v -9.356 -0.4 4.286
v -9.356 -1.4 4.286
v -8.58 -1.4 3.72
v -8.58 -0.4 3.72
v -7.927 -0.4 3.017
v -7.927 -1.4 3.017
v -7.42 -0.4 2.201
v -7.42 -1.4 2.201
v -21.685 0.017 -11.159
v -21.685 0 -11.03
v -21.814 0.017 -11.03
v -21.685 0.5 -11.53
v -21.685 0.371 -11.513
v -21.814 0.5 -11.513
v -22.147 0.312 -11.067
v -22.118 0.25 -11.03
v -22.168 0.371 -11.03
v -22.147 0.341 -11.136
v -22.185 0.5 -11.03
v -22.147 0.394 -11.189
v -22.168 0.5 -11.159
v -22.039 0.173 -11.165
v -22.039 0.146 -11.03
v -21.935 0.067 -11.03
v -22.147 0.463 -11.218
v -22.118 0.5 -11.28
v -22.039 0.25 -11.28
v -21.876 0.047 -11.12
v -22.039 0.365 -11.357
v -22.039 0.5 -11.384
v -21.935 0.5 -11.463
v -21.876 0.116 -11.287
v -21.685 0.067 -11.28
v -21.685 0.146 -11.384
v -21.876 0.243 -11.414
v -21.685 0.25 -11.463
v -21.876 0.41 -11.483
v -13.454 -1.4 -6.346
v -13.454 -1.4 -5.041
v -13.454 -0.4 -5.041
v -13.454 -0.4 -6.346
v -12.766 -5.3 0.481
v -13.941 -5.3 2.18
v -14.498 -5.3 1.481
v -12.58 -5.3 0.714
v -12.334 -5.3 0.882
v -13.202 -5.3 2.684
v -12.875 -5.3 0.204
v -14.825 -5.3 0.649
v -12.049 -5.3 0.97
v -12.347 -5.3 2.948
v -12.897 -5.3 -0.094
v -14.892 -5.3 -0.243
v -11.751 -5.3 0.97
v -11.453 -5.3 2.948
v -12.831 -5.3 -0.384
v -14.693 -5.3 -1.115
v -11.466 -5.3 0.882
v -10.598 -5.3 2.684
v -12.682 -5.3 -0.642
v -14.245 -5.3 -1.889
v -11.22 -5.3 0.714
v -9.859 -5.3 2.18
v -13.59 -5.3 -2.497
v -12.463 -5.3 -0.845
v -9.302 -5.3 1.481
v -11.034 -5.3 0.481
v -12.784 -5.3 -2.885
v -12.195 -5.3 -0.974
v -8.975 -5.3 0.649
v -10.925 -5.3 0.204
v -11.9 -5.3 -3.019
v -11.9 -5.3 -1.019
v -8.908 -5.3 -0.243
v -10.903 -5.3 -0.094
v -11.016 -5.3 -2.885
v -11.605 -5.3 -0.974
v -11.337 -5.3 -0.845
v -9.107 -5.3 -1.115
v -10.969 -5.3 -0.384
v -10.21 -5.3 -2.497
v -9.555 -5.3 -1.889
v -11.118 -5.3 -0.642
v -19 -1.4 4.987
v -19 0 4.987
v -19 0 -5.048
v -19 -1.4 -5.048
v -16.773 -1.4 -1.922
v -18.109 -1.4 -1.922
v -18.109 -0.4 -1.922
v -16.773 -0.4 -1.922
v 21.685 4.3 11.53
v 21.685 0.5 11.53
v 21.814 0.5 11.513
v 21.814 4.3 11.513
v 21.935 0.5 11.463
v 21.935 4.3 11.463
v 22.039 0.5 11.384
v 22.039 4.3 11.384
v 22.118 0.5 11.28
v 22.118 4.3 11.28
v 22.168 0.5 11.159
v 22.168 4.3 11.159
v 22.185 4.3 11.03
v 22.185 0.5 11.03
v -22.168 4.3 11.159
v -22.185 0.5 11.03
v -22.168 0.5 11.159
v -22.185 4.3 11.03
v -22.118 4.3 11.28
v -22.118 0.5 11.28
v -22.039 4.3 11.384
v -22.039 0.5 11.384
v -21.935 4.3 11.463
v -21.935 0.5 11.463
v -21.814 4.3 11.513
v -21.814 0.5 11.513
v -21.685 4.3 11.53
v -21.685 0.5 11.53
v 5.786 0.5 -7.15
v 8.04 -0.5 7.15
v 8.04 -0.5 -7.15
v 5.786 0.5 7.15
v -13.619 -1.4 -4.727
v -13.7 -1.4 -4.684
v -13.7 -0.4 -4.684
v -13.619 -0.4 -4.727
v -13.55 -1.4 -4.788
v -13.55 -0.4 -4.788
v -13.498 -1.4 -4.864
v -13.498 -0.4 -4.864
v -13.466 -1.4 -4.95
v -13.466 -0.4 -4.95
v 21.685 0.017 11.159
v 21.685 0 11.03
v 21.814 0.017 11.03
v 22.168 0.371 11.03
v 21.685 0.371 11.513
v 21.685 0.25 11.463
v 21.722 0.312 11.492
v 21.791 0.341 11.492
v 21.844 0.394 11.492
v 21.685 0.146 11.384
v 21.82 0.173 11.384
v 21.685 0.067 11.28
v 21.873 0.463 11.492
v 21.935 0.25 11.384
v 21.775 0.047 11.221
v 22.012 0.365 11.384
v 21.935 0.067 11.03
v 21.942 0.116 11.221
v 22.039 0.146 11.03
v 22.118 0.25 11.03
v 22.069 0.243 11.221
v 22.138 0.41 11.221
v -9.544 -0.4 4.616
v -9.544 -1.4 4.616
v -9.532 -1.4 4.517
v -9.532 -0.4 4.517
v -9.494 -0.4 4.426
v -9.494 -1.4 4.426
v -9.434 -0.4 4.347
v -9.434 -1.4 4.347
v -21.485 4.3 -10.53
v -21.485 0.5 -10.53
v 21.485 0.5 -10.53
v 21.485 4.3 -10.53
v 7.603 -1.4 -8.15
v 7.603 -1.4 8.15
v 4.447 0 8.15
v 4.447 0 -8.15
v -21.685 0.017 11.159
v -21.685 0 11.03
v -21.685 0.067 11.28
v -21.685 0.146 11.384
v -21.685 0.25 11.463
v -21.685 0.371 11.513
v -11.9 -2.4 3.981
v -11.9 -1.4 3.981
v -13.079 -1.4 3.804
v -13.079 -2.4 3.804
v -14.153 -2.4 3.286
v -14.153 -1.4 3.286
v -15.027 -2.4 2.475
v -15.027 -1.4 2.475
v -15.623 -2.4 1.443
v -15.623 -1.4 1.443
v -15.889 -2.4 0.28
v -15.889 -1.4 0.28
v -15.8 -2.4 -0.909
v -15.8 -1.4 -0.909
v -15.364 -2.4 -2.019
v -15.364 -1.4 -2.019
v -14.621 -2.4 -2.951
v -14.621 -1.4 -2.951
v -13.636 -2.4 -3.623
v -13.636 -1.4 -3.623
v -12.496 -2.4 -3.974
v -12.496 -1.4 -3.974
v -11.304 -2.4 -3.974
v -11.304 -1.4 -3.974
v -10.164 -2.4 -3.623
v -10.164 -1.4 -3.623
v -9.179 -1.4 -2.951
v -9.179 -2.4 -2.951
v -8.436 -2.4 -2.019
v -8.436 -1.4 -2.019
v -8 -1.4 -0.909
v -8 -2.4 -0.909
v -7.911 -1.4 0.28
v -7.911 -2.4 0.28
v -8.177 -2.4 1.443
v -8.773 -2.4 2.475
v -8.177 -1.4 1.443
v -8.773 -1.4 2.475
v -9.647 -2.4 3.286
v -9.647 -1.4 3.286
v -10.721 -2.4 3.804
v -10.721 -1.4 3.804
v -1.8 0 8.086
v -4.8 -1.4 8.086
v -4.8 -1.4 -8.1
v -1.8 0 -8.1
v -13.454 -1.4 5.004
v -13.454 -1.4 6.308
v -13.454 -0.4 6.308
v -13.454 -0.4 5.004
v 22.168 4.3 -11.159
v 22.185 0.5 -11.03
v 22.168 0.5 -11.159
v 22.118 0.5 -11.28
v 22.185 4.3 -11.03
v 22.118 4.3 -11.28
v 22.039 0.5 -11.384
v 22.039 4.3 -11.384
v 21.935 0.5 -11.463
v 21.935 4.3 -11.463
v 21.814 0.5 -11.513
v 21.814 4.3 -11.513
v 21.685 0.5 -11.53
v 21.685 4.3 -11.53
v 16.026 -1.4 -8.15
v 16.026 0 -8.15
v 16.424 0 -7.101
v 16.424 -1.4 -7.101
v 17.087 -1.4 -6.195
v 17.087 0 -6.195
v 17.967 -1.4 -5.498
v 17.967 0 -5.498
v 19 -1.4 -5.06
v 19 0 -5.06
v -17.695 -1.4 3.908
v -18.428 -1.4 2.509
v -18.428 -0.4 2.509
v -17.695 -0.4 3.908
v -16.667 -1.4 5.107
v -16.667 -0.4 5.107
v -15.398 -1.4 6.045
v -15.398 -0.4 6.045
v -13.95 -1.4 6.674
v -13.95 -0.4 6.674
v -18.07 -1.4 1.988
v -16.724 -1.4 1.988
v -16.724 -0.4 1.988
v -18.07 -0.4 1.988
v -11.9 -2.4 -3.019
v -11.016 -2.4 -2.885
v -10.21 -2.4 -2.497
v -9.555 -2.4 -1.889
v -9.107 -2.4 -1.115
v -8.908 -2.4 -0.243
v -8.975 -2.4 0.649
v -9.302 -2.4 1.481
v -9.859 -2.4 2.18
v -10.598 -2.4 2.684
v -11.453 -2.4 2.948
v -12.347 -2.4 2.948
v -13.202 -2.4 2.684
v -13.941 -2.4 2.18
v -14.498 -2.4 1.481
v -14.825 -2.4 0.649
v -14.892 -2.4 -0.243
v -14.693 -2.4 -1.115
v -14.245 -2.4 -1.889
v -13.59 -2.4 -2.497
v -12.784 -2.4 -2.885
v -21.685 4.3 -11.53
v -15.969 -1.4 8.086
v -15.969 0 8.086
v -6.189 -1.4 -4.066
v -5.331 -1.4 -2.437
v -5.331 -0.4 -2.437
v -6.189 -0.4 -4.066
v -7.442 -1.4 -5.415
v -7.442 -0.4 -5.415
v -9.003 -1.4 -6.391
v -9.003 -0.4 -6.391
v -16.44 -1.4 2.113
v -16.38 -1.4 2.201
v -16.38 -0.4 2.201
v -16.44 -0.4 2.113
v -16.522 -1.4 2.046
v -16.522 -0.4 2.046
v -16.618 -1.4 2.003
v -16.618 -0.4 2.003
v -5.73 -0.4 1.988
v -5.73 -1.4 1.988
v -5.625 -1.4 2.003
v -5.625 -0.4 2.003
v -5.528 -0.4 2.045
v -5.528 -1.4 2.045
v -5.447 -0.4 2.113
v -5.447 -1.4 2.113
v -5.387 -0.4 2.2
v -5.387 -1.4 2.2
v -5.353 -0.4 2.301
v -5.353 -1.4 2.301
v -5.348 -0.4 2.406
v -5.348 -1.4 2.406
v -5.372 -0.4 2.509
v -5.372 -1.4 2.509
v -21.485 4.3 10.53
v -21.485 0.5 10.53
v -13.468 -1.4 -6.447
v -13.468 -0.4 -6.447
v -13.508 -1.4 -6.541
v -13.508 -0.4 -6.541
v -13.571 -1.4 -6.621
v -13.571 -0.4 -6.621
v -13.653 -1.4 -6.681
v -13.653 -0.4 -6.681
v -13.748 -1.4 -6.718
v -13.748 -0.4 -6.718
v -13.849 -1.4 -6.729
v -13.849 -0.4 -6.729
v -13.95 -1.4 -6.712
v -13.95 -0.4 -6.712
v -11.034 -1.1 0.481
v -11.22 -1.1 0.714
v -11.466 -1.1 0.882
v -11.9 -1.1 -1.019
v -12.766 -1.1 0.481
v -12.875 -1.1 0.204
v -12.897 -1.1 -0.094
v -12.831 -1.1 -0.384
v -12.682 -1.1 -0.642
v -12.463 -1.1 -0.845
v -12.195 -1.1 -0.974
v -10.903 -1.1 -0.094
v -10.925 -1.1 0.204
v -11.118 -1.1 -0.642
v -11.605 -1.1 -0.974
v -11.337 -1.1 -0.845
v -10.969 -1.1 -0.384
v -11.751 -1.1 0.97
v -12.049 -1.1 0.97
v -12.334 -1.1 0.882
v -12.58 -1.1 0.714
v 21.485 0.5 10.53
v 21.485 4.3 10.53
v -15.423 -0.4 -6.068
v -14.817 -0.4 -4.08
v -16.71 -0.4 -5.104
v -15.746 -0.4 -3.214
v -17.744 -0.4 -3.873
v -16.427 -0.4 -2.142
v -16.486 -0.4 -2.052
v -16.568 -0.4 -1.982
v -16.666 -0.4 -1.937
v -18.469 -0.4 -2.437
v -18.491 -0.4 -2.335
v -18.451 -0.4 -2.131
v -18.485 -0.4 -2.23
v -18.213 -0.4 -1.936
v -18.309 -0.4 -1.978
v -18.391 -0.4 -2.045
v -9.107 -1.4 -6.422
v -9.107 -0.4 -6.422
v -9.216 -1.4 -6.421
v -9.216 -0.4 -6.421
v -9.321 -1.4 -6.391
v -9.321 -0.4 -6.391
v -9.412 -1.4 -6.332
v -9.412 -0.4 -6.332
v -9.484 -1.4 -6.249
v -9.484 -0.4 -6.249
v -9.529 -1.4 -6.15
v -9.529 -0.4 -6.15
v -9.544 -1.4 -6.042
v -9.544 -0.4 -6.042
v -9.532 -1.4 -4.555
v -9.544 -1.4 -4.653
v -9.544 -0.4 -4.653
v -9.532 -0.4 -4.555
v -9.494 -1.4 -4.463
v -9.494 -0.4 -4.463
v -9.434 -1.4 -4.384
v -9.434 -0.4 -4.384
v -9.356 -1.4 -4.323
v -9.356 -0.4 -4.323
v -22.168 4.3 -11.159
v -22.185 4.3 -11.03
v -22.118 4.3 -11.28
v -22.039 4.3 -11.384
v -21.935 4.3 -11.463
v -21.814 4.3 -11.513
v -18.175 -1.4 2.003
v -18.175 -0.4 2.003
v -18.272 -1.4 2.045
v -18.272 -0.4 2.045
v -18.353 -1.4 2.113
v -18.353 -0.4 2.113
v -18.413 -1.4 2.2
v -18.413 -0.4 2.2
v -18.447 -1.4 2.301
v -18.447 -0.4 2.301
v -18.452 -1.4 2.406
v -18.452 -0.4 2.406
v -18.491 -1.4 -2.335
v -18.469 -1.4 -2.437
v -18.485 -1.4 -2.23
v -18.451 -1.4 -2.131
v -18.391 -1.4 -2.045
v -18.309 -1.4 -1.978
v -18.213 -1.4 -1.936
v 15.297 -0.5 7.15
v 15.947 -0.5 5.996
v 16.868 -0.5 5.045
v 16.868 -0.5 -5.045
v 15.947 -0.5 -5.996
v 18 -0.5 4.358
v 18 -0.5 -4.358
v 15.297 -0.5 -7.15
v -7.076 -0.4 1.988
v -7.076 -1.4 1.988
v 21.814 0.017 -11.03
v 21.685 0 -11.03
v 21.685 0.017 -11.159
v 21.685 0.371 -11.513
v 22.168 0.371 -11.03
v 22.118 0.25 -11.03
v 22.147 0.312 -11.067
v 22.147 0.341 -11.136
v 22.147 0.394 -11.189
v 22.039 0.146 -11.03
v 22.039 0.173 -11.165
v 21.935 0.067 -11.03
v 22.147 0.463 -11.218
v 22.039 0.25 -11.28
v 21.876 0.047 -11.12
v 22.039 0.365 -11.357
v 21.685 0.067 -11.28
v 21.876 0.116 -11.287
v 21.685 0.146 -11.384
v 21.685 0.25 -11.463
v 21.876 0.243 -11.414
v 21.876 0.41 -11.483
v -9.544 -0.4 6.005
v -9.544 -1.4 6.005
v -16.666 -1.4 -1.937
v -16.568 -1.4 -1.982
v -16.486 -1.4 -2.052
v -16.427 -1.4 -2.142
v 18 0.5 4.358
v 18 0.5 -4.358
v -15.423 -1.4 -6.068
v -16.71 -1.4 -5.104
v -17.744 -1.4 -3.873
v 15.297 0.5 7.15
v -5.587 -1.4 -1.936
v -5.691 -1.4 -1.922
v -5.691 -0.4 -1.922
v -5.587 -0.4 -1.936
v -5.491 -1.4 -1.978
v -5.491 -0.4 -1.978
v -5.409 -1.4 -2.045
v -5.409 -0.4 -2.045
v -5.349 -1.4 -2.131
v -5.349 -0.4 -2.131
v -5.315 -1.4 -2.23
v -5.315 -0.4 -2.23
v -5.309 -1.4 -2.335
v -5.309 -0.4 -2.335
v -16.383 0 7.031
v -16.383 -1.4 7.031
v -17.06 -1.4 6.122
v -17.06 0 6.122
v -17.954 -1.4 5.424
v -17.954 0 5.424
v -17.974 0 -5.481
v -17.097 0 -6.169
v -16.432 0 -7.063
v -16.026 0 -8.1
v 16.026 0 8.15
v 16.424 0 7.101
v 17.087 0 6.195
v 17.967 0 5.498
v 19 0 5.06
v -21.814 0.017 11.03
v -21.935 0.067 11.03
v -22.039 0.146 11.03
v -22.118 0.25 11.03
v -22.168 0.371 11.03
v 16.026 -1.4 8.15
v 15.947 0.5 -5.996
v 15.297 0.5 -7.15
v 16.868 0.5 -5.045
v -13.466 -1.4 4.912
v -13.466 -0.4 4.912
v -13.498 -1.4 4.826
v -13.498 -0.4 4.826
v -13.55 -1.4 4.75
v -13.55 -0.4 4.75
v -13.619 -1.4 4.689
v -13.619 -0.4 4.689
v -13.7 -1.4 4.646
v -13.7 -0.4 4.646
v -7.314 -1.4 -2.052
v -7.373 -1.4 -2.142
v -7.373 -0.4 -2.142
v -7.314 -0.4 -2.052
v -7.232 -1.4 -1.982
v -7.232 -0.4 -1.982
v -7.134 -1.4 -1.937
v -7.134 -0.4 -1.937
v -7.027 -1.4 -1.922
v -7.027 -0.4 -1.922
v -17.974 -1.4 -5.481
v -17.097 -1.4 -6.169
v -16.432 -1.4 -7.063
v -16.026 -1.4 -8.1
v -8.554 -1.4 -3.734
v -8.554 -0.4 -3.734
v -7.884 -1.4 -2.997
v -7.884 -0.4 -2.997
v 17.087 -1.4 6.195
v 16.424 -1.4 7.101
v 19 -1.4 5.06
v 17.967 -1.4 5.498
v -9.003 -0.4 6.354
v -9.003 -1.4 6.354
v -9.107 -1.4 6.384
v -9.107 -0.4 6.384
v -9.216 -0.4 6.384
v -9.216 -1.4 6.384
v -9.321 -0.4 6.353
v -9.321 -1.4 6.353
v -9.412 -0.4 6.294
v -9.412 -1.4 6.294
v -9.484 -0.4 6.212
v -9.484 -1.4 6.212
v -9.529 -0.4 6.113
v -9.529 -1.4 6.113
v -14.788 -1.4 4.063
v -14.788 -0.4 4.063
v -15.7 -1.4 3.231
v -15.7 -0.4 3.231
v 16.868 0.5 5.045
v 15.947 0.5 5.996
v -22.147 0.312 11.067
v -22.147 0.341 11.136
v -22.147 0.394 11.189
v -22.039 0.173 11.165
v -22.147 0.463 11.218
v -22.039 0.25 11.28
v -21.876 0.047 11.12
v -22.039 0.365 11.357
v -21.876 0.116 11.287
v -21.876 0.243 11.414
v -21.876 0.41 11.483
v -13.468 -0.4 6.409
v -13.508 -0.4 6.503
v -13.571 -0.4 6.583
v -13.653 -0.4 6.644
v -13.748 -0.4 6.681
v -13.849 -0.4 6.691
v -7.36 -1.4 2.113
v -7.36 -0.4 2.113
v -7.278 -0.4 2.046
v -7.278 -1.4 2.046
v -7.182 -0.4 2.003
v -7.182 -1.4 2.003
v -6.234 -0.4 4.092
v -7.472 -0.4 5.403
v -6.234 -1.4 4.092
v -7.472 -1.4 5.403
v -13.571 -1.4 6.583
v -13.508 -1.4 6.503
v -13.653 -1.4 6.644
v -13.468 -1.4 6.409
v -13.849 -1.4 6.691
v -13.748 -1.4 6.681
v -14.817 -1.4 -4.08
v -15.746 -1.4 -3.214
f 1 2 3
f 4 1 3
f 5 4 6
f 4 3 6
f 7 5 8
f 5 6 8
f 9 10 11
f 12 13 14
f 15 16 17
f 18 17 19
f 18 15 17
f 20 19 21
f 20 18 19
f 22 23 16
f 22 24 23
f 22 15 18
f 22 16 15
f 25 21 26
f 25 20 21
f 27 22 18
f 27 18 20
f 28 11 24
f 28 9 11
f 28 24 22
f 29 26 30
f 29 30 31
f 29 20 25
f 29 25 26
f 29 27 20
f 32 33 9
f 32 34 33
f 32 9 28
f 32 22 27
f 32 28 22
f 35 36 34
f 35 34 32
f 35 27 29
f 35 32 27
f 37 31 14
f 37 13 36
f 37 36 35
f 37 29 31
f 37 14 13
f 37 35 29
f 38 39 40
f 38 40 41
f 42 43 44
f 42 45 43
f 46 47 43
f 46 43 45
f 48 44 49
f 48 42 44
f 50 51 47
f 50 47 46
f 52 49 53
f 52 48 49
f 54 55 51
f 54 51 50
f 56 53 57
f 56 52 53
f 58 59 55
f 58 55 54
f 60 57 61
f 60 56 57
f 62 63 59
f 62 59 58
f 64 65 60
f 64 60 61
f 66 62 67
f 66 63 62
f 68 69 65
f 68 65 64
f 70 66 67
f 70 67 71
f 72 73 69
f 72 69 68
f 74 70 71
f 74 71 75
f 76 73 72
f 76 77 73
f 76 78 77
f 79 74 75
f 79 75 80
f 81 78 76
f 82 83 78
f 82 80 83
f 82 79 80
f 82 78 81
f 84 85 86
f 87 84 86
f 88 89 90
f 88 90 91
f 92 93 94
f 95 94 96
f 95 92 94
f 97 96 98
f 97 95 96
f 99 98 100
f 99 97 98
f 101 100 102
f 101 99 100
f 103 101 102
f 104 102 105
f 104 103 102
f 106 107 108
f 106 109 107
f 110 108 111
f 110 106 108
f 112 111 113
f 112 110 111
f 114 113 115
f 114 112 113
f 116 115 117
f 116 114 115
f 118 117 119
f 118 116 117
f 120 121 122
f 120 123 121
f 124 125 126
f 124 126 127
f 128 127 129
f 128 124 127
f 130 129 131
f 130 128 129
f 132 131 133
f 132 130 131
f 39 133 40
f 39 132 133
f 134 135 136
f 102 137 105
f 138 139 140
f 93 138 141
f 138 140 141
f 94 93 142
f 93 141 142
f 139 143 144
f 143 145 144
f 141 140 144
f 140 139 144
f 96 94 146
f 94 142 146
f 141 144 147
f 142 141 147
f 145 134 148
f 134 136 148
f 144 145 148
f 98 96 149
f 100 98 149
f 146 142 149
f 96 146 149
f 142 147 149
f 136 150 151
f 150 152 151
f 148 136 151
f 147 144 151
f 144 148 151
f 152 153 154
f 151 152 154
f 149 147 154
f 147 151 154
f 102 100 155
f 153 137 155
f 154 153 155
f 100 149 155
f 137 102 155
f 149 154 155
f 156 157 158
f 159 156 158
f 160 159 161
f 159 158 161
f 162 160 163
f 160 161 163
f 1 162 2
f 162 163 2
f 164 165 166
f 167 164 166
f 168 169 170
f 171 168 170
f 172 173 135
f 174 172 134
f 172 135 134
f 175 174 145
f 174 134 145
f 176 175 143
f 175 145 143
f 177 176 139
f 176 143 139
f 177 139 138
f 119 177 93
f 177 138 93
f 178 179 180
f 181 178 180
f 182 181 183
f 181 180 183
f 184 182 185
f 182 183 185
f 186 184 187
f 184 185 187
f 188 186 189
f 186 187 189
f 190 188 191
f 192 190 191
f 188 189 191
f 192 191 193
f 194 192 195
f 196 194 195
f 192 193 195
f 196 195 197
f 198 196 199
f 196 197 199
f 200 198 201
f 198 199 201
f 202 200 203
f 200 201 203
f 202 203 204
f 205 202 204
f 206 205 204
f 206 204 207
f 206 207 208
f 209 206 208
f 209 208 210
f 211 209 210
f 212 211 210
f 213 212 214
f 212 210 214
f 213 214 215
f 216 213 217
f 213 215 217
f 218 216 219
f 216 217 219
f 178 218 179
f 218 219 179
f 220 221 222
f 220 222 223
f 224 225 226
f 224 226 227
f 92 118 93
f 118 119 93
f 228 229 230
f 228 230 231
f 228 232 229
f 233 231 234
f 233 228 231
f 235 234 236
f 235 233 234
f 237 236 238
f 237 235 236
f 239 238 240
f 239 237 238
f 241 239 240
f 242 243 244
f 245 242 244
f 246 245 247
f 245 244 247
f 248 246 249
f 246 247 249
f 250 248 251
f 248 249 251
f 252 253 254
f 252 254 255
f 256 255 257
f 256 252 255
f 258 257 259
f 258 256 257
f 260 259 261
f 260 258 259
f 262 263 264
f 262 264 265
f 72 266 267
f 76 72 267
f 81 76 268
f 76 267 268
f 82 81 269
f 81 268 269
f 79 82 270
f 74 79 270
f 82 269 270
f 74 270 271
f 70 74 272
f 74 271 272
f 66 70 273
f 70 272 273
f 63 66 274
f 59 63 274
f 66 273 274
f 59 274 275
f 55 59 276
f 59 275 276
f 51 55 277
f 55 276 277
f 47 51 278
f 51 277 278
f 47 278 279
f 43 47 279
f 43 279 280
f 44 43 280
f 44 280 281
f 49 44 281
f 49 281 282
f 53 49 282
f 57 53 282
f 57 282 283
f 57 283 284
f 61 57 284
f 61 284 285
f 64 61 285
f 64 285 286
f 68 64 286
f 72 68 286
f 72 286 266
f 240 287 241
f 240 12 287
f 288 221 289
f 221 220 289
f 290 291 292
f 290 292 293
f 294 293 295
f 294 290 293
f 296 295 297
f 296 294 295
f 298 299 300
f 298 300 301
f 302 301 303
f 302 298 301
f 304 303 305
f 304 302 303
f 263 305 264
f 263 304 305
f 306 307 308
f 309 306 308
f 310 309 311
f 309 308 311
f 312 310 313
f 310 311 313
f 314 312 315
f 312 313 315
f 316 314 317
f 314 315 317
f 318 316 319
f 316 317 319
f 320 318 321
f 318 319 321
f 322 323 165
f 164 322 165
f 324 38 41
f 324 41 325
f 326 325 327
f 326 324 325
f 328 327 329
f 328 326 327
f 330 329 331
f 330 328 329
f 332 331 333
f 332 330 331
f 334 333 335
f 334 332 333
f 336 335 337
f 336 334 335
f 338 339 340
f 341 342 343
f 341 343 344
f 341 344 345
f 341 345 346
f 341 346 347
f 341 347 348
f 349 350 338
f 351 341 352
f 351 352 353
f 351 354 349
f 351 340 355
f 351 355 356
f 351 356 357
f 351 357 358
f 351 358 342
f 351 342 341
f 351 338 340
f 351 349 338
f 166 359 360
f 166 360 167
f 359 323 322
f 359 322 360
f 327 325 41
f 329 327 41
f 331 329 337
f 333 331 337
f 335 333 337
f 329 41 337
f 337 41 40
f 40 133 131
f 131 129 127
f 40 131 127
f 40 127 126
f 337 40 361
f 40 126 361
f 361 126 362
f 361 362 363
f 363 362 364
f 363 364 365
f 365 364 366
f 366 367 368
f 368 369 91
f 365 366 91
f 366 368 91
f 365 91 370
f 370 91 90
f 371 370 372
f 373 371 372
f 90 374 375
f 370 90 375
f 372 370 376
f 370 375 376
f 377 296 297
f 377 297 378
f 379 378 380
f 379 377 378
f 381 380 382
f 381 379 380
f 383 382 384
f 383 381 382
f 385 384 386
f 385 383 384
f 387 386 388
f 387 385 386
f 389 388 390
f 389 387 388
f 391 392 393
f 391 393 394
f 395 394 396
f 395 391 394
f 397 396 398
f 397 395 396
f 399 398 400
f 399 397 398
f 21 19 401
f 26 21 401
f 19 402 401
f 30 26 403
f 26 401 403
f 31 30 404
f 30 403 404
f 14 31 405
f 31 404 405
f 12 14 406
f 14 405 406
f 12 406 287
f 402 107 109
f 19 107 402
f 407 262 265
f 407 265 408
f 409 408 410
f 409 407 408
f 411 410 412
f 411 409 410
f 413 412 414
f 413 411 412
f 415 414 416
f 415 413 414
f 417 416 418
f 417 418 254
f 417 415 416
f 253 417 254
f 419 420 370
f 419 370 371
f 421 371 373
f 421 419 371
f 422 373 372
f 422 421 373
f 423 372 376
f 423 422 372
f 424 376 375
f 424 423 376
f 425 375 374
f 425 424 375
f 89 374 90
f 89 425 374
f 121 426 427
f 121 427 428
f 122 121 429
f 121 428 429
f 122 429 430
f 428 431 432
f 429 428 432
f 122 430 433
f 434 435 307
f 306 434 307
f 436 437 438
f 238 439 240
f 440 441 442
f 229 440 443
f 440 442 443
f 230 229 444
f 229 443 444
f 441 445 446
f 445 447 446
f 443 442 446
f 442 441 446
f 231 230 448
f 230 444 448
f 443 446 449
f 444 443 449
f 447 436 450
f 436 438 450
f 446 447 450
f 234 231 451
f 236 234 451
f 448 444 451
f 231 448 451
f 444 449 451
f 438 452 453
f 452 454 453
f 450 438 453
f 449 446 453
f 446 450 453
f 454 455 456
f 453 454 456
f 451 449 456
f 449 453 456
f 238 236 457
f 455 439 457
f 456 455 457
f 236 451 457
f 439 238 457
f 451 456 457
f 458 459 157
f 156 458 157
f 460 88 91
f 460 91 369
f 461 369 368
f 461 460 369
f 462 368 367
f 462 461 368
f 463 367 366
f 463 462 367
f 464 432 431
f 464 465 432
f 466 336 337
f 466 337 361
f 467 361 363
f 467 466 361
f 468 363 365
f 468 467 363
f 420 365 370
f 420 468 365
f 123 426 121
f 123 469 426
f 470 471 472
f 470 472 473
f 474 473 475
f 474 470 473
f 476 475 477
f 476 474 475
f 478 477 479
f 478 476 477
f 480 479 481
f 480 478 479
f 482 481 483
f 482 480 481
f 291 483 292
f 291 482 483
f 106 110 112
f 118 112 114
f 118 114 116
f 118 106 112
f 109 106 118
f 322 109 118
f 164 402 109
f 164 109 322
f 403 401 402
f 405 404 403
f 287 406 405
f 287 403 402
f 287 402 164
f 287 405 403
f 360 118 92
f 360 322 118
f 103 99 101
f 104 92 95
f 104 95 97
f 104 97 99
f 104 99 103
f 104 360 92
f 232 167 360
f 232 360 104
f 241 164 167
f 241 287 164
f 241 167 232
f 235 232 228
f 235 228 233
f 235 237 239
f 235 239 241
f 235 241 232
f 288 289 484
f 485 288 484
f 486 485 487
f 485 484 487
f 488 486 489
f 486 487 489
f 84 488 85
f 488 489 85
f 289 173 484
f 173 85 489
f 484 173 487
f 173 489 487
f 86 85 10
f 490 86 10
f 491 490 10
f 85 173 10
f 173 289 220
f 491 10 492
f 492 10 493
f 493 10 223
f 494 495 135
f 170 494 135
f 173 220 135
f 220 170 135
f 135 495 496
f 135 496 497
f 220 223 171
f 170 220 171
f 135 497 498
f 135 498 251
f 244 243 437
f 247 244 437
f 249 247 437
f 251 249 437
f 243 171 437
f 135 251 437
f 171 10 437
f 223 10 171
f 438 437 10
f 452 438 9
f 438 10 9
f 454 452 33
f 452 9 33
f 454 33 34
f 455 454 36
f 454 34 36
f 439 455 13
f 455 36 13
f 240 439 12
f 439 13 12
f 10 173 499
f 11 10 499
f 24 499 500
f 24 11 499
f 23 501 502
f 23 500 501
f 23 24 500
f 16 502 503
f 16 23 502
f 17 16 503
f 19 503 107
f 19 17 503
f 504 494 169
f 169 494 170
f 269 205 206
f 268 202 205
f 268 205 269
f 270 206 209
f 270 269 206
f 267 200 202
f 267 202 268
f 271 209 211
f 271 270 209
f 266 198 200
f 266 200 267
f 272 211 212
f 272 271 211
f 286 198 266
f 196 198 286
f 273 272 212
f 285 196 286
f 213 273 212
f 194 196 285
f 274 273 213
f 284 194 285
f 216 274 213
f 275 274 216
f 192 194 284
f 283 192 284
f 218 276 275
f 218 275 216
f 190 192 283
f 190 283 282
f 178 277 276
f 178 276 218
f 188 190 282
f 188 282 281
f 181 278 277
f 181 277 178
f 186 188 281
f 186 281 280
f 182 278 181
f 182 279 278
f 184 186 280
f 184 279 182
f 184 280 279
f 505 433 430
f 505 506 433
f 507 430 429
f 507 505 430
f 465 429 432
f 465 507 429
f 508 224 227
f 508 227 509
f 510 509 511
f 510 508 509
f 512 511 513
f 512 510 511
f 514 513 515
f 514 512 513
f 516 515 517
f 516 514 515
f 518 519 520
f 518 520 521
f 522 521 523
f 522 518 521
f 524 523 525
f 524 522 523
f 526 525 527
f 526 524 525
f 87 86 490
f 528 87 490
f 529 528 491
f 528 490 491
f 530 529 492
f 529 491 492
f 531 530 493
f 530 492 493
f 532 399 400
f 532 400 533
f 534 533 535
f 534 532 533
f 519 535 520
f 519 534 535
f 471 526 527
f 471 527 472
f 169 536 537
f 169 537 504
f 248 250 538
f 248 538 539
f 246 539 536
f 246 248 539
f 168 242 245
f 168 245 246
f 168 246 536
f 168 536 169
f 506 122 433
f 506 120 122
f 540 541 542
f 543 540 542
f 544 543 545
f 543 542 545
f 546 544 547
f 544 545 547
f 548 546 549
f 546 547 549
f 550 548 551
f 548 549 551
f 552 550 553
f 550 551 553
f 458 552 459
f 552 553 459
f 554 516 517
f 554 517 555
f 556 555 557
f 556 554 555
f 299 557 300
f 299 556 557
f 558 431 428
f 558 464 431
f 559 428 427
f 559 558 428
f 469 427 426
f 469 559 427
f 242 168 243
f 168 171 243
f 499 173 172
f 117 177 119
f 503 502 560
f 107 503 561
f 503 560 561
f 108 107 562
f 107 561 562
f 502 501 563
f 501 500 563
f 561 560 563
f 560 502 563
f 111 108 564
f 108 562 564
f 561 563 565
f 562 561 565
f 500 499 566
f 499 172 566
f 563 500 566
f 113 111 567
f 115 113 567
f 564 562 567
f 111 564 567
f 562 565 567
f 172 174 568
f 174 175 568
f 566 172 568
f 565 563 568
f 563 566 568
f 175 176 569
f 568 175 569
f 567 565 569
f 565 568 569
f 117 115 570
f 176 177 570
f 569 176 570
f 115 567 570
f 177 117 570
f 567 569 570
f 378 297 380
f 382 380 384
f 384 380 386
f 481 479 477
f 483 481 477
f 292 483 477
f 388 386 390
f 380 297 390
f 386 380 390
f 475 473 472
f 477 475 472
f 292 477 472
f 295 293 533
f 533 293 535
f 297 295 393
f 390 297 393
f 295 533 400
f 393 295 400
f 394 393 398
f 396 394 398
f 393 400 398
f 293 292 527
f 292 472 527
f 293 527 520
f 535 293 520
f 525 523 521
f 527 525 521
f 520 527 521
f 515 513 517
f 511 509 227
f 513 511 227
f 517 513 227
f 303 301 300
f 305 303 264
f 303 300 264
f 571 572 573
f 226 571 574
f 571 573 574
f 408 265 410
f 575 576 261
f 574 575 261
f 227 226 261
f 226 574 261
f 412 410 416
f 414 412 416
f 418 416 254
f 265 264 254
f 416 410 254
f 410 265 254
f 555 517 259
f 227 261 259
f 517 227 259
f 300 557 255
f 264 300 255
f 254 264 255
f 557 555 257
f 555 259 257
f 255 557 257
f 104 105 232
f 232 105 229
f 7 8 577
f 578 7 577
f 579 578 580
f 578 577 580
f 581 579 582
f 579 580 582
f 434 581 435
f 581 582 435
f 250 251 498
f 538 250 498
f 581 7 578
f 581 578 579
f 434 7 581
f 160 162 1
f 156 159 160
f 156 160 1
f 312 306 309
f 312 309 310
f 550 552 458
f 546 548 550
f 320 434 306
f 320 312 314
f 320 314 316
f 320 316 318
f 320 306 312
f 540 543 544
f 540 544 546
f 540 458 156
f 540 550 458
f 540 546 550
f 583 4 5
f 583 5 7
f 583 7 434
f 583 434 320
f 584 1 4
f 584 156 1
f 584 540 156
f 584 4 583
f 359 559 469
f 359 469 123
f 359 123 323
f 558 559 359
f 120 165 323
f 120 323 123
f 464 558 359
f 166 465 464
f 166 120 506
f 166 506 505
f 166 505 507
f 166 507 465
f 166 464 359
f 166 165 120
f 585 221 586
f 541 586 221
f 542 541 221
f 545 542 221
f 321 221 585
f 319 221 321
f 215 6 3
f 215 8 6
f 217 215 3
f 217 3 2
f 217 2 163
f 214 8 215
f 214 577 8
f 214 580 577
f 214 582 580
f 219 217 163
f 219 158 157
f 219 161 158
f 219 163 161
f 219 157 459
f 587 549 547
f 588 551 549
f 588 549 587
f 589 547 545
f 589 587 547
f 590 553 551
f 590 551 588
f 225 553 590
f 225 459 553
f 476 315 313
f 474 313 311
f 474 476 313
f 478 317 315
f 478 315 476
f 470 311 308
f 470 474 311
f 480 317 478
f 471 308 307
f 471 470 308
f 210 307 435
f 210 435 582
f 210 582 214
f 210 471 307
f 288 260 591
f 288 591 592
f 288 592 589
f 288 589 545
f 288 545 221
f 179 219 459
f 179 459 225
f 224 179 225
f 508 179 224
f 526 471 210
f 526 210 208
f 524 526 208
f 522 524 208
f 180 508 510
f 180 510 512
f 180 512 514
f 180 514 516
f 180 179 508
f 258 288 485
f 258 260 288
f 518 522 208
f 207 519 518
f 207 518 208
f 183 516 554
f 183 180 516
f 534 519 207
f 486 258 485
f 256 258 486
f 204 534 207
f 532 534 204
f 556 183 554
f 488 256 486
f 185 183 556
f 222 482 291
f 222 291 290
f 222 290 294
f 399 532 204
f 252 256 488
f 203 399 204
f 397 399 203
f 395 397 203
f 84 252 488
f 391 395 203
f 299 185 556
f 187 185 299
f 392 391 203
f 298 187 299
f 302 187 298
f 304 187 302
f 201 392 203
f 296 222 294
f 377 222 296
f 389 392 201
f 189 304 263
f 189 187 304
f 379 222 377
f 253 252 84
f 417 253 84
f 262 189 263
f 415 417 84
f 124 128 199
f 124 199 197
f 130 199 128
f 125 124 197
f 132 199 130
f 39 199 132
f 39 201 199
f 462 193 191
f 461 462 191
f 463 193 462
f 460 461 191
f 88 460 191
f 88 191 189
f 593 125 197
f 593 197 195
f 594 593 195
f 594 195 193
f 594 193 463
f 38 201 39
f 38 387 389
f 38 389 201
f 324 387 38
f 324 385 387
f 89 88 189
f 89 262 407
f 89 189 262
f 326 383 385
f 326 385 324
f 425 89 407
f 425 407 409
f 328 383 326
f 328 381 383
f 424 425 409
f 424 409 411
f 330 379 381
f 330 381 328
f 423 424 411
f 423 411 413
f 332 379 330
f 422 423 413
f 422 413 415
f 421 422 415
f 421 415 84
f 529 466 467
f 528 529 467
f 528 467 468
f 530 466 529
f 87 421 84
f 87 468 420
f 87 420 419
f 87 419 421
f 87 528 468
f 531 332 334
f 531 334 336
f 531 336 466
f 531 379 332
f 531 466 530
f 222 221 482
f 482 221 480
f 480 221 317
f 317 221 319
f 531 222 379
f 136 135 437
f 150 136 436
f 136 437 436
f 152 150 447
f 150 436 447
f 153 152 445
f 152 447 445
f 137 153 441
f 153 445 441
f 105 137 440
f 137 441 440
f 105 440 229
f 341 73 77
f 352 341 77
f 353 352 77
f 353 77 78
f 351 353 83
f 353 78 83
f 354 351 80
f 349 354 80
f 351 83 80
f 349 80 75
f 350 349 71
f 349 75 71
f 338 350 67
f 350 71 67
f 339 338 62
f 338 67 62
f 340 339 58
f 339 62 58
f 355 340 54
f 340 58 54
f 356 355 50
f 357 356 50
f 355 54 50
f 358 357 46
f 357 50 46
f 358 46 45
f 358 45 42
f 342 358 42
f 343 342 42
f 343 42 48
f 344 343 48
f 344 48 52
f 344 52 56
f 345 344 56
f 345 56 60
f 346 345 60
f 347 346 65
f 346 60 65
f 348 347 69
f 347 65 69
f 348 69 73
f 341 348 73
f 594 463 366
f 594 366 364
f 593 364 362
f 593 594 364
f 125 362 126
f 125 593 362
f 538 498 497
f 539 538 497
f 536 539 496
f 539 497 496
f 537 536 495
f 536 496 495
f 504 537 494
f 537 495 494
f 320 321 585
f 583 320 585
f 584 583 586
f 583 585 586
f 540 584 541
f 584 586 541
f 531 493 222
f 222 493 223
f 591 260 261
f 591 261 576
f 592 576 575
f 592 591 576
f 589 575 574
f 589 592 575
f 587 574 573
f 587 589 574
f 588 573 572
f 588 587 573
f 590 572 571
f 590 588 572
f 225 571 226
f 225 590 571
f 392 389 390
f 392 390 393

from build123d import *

# Parameters (mm, degrees)
BOTTOM_COVER_SKETCH_01_W                   = 44.37
BOTTOM_COVER_SKETCH_01_H                   = 23.06
BOTTOM_COVER_EXT_SHAPE_DEPTH               = 4.3
SALIENTE_EXTRUIR1_DEPTH                    = 1.4
CORTAR_EXTRUIR1_DEPTH                      = 30.966091253
CORTAR_EXTRUIR1_DEPTH_BACK                 = 30.966091253
VACIADO2_START                             = 0.5
VACIADO2_OUTLINE_W                         = 42.97
VACIADO2_OUTLINE_H                         = 21.06
VACIADO2_DEPTH                             = 3.8
SALIENTE_EXTRUIR2_DEPTH                    = 1.4
CORTAR_EXTRUIR2_DEPTH                      = 30.933277886
CORTAR_EXTRUIR2_DEPTH_BACK                 = 30.933277886
BOTTOM_POWER_TAKE_OFF_SHAFT_SKETCH_R       = 3
POWER_TAKE_OFF_SHAFT_EXTRUDE_01_DEPTH      = 3.9
BOTTOM_POWER_TAKE_OFF_SHAFT_SKETCH_3_R     = 4
BOTTOM_POWER_TAKE_OFF_SHAFT_SKETCH_3_R_2   = 3
POWER_TAKE_OFF_SHAFT_EXTRUDE_02_DEPTH      = 1
POWER_TAKE_OFF_SHAFT_CUT_DEPTH             = 1
POWER_TAKE_OFF_SHAFT_BOTTOM_COVER_SKETCH_R = 1
CORTAR_EXTRUIR4_DEPTH                      = 4.2
REDONDEO1_R                                = 0.5


with BuildPart() as part:
    # bottom-cover-sketch-01 → Bottom-cover-ext-shape (new body)
    with BuildSketch(Plane(origin=(0, 0, 0), x_dir=(1, 0, 0), z_dir=(0, 1, 0))):
        Rectangle(BOTTOM_COVER_SKETCH_01_W, BOTTOM_COVER_SKETCH_01_H)
    extrude(amount=BOTTOM_COVER_EXT_SHAPE_DEPTH)

    # bottom-cover-sketch-01<31> → Saliente-Extruir1 (add)
    with BuildSketch(Plane(origin=(0, 0, 0), x_dir=(1, 0, 0), z_dir=(0, 1, 0))):
        with BuildLine():
            Line((4.447, 8.15), (16.025784389, 8.15))
            ThreePointArc((16.025784389, 8.15), (17.087381076, 6.195438755), (19, 5.06001547))
            Line((19, 5.06001547), (19, -5.06001547))
            ThreePointArc((19, -5.06001547), (17.087381076, -6.195438755), (16.025784389, -8.15))
            Line((16.025784389, -8.15), (4.447, -8.15))
            Line((4.447, -8.15), (4.447, 8.15))
        make_face()
    extrude(amount=-SALIENTE_EXTRUIR1_DEPTH)

    # Croquis3 → Cortar-Extruir1 (cut, two sides: drawn at the far end of the back side and taken through both)
    with BuildSketch(Plane.XY.offset(8.15).offset(-CORTAR_EXTRUIR1_DEPTH_BACK)):
        Polygon((4.447, -1.4), (7.603, -1.4), (4.447, 0), align=None)
    extrude(amount=CORTAR_EXTRUIR1_DEPTH + CORTAR_EXTRUIR1_DEPTH_BACK, mode=Mode.SUBTRACT)

    # Vaciado2: read off the stored shape, not the designer's step
    # Vaciado2 outline → Vaciado2 (cut)
    with BuildSketch(Plane(origin=(0, 0, 0), x_dir=(1, 0, 0), z_dir=(0, 1, 0)).offset(VACIADO2_START)):
        Rectangle(VACIADO2_OUTLINE_W, VACIADO2_OUTLINE_H)
    extrude(amount=VACIADO2_DEPTH, mode=Mode.SUBTRACT)

    # Vaciado2 2: loft between two sections, ruled curve by curve
    vaciado2_2_from = [
        Edge.make_three_point_arc((15.297011486, -0.5, -7.15), (16.377210633, -0.5, -5.491282779), (18, -0.5, -4.357824492)),
        Edge.make_three_point_arc((18, -0.5, 4.357824492), (16.377210633, -0.5, 5.491282779), (15.297011486, -0.5, 7.15)),
        Edge.make_line((8.040274257, -0.5, -7.15), (15.297011486, -0.5, -7.15)),
        Edge.make_line((15.297011486, -0.5, 7.15), (8.040274257, -0.5, 7.15)),
        Edge.make_line((18, -0.5, -4.357824492), (18, -0.5, 4.357824492)),
        Edge.make_line((8.040274257, -0.5, 7.15), (8.040274257, -0.5, -7.15)),
    ]
    vaciado2_2_to = [
        Edge.make_three_point_arc((15.297011486, 0.5, -7.15), (16.377210633, 0.5, -5.491282779), (18, 0.5, -4.357824492)),
        Edge.make_three_point_arc((18, 0.5, 4.357824492), (16.377210633, 0.5, 5.491282779), (15.297011486, 0.5, 7.15)),
        Edge.make_line((5.785988543, 0.5, -7.15), (15.297011486, 0.5, -7.15)),
        Edge.make_line((15.297011486, 0.5, 7.15), (5.785988543, 0.5, 7.15)),
        Edge.make_line((18, 0.5, -4.357824492), (18, 0.5, 4.357824492)),
        Edge.make_line((5.785988543, 0.5, 7.15), (5.785988543, 0.5, -7.15)),
    ]
    vaciado2_2 = Solid(Shell([*[Face.make_surface_from_curves(vaciado2_2_from[k], vaciado2_2_to[k]) for k in range(6)], Face(Wire(vaciado2_2_from)), Face(Wire(vaciado2_2_to))]))
    add(vaciado2_2, mode=Mode.SUBTRACT)

    # bottom-cover-sketch-01<32> → Saliente-Extruir2 (add)
    with BuildSketch(Plane(origin=(0, 0, 0), x_dir=(1, 0, 0), z_dir=(0, 1, 0))):
        with BuildLine():
            Line((-1.8, -8.085967922), (-15.968544519, -8.085967922))
            ThreePointArc((-15.968544519, -8.085967922), (-17.060455349, -6.121867553), (-19, -4.986911136))
            Line((-19, -4.986911136), (-19, 5.04796656))
            ThreePointArc((-19, 5.04796656), (-17.09705221, 6.168745986), (-16.025784389, 8.1))
            Line((-16.025784389, 8.1), (-1.8, 8.1))
            Line((-1.8, 8.1), (-1.8, -8.085967922))
        make_face()
    extrude(amount=-SALIENTE_EXTRUIR2_DEPTH)

    # Croquis4 → Cortar-Extruir2 (cut, two sides: drawn at the far end of the back side and taken through both)
    with BuildSketch(Plane(origin=(0, 0, -8.1), x_dir=(-1, 0, 0), z_dir=(0, 0, -1)).offset(-CORTAR_EXTRUIR2_DEPTH_BACK)):
        Polygon((1.8, -1.4), (4.8, -1.4), (1.8, 0), align=None)
    extrude(amount=CORTAR_EXTRUIR2_DEPTH + CORTAR_EXTRUIR2_DEPTH_BACK, mode=Mode.SUBTRACT)

    # Bottom-power-take-off-shaft-sketch → Power-take-off-shaft-extrude-01 (add)
    with BuildSketch(Plane.XZ.offset(1.4)):
        with Locations(Location((-11.9, -0.018771875, 0), (0, 0, 270))):
            Circle(BOTTOM_POWER_TAKE_OFF_SHAFT_SKETCH_R)
    extrude(amount=POWER_TAKE_OFF_SHAFT_EXTRUDE_01_DEPTH)

    # Bottom-power-take-off-shaft-sketch<3> → Power-take-off-shaft-extrude-02 (add)
    with BuildSketch(Plane.XZ.offset(1.4)):
        with Locations(Location((-11.9, -0.018771875, 0), (0, 0, 90))):
            Circle(BOTTOM_POWER_TAKE_OFF_SHAFT_SKETCH_3_R)
        with Locations(Location((-11.9, -0.018771875, 0), (0, 0, 270))):
            Circle(BOTTOM_POWER_TAKE_OFF_SHAFT_SKETCH_3_R_2, mode=Mode.SUBTRACT)
    extrude(amount=POWER_TAKE_OFF_SHAFT_EXTRUDE_02_DEPTH)

    # Bottom-power-take-off-shaft-sketch<4> → Power-take-off-shaft-cut (cut)
    with BuildSketch(Plane.XZ.offset(1.4)):
        with BuildLine():
            Line((-13.454482392, -5.041059169), (-13.454482392, -6.345663941))
            ThreePointArc((-13.454482392, -6.345663941), (-13.609767702, -6.653654843), (-13.949729169, -6.711948276))
            ThreePointArc((-13.949729169, -6.711948276), (-16.710183373, -5.104254736), (-18.468864278, -2.437453767))
            ThreePointArc((-18.468864278, -2.437453767), (-18.423589426, -2.085954505), (-18.109382928, -1.922016039))
            Line((-18.109382928, -1.922016039), (-16.773422083, -1.922016039))
            ThreePointArc((-16.773422083, -1.922016039), (-16.567971503, -1.981769919), (-16.426615215, -2.142390177))
            ThreePointArc((-16.426615215, -2.142390177), (-15.30881206, -3.676640153), (-13.699675431, -4.68365862))
            ThreePointArc((-13.699675431, -4.68365862), (-13.521673241, -4.824348083), (-13.454482392, -5.041059169))
        make_face()
        with BuildLine():
            ThreePointArc((-18.070283639, 1.987983961), (-18.386311386, 2.15455721), (-18.427501404, 2.509414316))
            ThreePointArc((-18.427501404, 2.509414316), (-16.667494828, 5.106751812), (-13.949729169, 6.674404526))
            ThreePointArc((-13.949729169, 6.674404526), (-13.609767702, 6.616111093), (-13.454482392, 6.30812019))
            Line((-13.454482392, 6.30812019), (-13.454482392, 5.003515418))
            ThreePointArc((-13.454482392, 5.003515418), (-13.521673241, 4.786804333), (-13.699675431, 4.64611487))
            ThreePointArc((-13.699675431, 4.64611487), (-15.269573485, 3.675273946), (-16.380250969, 2.200991908))
            ThreePointArc((-16.380250969, 2.200991908), (-16.52151792, 2.045563265), (-16.723505638, 1.987983961))
            Line((-16.723505638, 1.987983961), (-18.070283639, 1.987983961))
        make_face()
        with BuildLine():
            ThreePointArc((-5.372498596, 2.509414316), (-6.810764187, 4.78744065), (-9.002861085, 6.353557848))
            ThreePointArc((-9.002861085, 6.353557848), (-9.368785516, 6.326920146), (-9.544482392, 6.00483186))
            Line((-9.544482392, 6.00483186), (-9.544482392, 4.615622196))
            ThreePointArc((-9.544482392, 4.615622196), (-9.494125288, 4.425766238), (-9.356293346, 4.285825255))
            ThreePointArc((-9.356293346, 4.285825255), (-8.236582512, 3.384075801), (-7.419749031, 2.200991908))
            ThreePointArc((-7.419749031, 2.200991908), (-7.27848208, 2.045563265), (-7.076494362, 1.987983961))
            Line((-7.076494362, 1.987983961), (-5.729716361, 1.987983961))
            ThreePointArc((-5.729716361, 1.987983961), (-5.413688614, 2.15455721), (-5.372498596, 2.509414316))
        make_face()
        with BuildLine():
            Line((-7.026577917, -1.922016039), (-5.690617072, -1.922016039))
            ThreePointArc((-5.690617072, -1.922016039), (-5.376410574, -2.085954505), (-5.331135722, -2.437453767))
            ThreePointArc((-5.331135722, -2.437453767), (-6.770756692, -4.782264616), (-9.002861085, -6.391101599))
            ThreePointArc((-9.002861085, -6.391101599), (-9.368785516, -6.364463896), (-9.544482392, -6.04237561))
            Line((-9.544482392, -6.04237561), (-9.544482392, -4.653165946))
            ThreePointArc((-9.544482392, -4.653165946), (-9.494125288, -4.463309988), (-9.356293346, -4.323369006))
            ThreePointArc((-9.356293346, -4.323369006), (-8.200468949, -3.382322083), (-7.373384785, -2.142390177))
            ThreePointArc((-7.373384785, -2.142390177), (-7.232028497, -1.981769919), (-7.026577917, -1.922016039))
        make_face()
    extrude(amount=-POWER_TAKE_OFF_SHAFT_CUT_DEPTH, mode=Mode.SUBTRACT)

    # Power-take-off-shaft-bottom-cover-sketch → Cortar-Extruir4 (cut)
    with BuildSketch(Plane.XZ.offset(5.3)):
        with Locations(Location((-11.9, -0.018771875, 0), (0, 0, 270))):
            Circle(POWER_TAKE_OFF_SHAFT_BOTTOM_COVER_SKETCH_R)
    extrude(amount=-CORTAR_EXTRUIR4_DEPTH, mode=Mode.SUBTRACT)

    # Redondeo1
    redondeo1_edges = [part.edges().sort_by_distance(p)[0] for p in [
        (0, 0, -11.53),
        (22.185, 0, 0),
        (0, 0, 11.53),
        (-22.185, 0, 0),
        (-22.185, 2.15, -11.53),
        (22.185, 2.15, -11.53),
        (22.185, 2.15, 11.53),
        (-22.185, 2.15, 11.53),
    ]]
    fillet(redondeo1_edges, radius=REDONDEO1_R)


solid = part.part
